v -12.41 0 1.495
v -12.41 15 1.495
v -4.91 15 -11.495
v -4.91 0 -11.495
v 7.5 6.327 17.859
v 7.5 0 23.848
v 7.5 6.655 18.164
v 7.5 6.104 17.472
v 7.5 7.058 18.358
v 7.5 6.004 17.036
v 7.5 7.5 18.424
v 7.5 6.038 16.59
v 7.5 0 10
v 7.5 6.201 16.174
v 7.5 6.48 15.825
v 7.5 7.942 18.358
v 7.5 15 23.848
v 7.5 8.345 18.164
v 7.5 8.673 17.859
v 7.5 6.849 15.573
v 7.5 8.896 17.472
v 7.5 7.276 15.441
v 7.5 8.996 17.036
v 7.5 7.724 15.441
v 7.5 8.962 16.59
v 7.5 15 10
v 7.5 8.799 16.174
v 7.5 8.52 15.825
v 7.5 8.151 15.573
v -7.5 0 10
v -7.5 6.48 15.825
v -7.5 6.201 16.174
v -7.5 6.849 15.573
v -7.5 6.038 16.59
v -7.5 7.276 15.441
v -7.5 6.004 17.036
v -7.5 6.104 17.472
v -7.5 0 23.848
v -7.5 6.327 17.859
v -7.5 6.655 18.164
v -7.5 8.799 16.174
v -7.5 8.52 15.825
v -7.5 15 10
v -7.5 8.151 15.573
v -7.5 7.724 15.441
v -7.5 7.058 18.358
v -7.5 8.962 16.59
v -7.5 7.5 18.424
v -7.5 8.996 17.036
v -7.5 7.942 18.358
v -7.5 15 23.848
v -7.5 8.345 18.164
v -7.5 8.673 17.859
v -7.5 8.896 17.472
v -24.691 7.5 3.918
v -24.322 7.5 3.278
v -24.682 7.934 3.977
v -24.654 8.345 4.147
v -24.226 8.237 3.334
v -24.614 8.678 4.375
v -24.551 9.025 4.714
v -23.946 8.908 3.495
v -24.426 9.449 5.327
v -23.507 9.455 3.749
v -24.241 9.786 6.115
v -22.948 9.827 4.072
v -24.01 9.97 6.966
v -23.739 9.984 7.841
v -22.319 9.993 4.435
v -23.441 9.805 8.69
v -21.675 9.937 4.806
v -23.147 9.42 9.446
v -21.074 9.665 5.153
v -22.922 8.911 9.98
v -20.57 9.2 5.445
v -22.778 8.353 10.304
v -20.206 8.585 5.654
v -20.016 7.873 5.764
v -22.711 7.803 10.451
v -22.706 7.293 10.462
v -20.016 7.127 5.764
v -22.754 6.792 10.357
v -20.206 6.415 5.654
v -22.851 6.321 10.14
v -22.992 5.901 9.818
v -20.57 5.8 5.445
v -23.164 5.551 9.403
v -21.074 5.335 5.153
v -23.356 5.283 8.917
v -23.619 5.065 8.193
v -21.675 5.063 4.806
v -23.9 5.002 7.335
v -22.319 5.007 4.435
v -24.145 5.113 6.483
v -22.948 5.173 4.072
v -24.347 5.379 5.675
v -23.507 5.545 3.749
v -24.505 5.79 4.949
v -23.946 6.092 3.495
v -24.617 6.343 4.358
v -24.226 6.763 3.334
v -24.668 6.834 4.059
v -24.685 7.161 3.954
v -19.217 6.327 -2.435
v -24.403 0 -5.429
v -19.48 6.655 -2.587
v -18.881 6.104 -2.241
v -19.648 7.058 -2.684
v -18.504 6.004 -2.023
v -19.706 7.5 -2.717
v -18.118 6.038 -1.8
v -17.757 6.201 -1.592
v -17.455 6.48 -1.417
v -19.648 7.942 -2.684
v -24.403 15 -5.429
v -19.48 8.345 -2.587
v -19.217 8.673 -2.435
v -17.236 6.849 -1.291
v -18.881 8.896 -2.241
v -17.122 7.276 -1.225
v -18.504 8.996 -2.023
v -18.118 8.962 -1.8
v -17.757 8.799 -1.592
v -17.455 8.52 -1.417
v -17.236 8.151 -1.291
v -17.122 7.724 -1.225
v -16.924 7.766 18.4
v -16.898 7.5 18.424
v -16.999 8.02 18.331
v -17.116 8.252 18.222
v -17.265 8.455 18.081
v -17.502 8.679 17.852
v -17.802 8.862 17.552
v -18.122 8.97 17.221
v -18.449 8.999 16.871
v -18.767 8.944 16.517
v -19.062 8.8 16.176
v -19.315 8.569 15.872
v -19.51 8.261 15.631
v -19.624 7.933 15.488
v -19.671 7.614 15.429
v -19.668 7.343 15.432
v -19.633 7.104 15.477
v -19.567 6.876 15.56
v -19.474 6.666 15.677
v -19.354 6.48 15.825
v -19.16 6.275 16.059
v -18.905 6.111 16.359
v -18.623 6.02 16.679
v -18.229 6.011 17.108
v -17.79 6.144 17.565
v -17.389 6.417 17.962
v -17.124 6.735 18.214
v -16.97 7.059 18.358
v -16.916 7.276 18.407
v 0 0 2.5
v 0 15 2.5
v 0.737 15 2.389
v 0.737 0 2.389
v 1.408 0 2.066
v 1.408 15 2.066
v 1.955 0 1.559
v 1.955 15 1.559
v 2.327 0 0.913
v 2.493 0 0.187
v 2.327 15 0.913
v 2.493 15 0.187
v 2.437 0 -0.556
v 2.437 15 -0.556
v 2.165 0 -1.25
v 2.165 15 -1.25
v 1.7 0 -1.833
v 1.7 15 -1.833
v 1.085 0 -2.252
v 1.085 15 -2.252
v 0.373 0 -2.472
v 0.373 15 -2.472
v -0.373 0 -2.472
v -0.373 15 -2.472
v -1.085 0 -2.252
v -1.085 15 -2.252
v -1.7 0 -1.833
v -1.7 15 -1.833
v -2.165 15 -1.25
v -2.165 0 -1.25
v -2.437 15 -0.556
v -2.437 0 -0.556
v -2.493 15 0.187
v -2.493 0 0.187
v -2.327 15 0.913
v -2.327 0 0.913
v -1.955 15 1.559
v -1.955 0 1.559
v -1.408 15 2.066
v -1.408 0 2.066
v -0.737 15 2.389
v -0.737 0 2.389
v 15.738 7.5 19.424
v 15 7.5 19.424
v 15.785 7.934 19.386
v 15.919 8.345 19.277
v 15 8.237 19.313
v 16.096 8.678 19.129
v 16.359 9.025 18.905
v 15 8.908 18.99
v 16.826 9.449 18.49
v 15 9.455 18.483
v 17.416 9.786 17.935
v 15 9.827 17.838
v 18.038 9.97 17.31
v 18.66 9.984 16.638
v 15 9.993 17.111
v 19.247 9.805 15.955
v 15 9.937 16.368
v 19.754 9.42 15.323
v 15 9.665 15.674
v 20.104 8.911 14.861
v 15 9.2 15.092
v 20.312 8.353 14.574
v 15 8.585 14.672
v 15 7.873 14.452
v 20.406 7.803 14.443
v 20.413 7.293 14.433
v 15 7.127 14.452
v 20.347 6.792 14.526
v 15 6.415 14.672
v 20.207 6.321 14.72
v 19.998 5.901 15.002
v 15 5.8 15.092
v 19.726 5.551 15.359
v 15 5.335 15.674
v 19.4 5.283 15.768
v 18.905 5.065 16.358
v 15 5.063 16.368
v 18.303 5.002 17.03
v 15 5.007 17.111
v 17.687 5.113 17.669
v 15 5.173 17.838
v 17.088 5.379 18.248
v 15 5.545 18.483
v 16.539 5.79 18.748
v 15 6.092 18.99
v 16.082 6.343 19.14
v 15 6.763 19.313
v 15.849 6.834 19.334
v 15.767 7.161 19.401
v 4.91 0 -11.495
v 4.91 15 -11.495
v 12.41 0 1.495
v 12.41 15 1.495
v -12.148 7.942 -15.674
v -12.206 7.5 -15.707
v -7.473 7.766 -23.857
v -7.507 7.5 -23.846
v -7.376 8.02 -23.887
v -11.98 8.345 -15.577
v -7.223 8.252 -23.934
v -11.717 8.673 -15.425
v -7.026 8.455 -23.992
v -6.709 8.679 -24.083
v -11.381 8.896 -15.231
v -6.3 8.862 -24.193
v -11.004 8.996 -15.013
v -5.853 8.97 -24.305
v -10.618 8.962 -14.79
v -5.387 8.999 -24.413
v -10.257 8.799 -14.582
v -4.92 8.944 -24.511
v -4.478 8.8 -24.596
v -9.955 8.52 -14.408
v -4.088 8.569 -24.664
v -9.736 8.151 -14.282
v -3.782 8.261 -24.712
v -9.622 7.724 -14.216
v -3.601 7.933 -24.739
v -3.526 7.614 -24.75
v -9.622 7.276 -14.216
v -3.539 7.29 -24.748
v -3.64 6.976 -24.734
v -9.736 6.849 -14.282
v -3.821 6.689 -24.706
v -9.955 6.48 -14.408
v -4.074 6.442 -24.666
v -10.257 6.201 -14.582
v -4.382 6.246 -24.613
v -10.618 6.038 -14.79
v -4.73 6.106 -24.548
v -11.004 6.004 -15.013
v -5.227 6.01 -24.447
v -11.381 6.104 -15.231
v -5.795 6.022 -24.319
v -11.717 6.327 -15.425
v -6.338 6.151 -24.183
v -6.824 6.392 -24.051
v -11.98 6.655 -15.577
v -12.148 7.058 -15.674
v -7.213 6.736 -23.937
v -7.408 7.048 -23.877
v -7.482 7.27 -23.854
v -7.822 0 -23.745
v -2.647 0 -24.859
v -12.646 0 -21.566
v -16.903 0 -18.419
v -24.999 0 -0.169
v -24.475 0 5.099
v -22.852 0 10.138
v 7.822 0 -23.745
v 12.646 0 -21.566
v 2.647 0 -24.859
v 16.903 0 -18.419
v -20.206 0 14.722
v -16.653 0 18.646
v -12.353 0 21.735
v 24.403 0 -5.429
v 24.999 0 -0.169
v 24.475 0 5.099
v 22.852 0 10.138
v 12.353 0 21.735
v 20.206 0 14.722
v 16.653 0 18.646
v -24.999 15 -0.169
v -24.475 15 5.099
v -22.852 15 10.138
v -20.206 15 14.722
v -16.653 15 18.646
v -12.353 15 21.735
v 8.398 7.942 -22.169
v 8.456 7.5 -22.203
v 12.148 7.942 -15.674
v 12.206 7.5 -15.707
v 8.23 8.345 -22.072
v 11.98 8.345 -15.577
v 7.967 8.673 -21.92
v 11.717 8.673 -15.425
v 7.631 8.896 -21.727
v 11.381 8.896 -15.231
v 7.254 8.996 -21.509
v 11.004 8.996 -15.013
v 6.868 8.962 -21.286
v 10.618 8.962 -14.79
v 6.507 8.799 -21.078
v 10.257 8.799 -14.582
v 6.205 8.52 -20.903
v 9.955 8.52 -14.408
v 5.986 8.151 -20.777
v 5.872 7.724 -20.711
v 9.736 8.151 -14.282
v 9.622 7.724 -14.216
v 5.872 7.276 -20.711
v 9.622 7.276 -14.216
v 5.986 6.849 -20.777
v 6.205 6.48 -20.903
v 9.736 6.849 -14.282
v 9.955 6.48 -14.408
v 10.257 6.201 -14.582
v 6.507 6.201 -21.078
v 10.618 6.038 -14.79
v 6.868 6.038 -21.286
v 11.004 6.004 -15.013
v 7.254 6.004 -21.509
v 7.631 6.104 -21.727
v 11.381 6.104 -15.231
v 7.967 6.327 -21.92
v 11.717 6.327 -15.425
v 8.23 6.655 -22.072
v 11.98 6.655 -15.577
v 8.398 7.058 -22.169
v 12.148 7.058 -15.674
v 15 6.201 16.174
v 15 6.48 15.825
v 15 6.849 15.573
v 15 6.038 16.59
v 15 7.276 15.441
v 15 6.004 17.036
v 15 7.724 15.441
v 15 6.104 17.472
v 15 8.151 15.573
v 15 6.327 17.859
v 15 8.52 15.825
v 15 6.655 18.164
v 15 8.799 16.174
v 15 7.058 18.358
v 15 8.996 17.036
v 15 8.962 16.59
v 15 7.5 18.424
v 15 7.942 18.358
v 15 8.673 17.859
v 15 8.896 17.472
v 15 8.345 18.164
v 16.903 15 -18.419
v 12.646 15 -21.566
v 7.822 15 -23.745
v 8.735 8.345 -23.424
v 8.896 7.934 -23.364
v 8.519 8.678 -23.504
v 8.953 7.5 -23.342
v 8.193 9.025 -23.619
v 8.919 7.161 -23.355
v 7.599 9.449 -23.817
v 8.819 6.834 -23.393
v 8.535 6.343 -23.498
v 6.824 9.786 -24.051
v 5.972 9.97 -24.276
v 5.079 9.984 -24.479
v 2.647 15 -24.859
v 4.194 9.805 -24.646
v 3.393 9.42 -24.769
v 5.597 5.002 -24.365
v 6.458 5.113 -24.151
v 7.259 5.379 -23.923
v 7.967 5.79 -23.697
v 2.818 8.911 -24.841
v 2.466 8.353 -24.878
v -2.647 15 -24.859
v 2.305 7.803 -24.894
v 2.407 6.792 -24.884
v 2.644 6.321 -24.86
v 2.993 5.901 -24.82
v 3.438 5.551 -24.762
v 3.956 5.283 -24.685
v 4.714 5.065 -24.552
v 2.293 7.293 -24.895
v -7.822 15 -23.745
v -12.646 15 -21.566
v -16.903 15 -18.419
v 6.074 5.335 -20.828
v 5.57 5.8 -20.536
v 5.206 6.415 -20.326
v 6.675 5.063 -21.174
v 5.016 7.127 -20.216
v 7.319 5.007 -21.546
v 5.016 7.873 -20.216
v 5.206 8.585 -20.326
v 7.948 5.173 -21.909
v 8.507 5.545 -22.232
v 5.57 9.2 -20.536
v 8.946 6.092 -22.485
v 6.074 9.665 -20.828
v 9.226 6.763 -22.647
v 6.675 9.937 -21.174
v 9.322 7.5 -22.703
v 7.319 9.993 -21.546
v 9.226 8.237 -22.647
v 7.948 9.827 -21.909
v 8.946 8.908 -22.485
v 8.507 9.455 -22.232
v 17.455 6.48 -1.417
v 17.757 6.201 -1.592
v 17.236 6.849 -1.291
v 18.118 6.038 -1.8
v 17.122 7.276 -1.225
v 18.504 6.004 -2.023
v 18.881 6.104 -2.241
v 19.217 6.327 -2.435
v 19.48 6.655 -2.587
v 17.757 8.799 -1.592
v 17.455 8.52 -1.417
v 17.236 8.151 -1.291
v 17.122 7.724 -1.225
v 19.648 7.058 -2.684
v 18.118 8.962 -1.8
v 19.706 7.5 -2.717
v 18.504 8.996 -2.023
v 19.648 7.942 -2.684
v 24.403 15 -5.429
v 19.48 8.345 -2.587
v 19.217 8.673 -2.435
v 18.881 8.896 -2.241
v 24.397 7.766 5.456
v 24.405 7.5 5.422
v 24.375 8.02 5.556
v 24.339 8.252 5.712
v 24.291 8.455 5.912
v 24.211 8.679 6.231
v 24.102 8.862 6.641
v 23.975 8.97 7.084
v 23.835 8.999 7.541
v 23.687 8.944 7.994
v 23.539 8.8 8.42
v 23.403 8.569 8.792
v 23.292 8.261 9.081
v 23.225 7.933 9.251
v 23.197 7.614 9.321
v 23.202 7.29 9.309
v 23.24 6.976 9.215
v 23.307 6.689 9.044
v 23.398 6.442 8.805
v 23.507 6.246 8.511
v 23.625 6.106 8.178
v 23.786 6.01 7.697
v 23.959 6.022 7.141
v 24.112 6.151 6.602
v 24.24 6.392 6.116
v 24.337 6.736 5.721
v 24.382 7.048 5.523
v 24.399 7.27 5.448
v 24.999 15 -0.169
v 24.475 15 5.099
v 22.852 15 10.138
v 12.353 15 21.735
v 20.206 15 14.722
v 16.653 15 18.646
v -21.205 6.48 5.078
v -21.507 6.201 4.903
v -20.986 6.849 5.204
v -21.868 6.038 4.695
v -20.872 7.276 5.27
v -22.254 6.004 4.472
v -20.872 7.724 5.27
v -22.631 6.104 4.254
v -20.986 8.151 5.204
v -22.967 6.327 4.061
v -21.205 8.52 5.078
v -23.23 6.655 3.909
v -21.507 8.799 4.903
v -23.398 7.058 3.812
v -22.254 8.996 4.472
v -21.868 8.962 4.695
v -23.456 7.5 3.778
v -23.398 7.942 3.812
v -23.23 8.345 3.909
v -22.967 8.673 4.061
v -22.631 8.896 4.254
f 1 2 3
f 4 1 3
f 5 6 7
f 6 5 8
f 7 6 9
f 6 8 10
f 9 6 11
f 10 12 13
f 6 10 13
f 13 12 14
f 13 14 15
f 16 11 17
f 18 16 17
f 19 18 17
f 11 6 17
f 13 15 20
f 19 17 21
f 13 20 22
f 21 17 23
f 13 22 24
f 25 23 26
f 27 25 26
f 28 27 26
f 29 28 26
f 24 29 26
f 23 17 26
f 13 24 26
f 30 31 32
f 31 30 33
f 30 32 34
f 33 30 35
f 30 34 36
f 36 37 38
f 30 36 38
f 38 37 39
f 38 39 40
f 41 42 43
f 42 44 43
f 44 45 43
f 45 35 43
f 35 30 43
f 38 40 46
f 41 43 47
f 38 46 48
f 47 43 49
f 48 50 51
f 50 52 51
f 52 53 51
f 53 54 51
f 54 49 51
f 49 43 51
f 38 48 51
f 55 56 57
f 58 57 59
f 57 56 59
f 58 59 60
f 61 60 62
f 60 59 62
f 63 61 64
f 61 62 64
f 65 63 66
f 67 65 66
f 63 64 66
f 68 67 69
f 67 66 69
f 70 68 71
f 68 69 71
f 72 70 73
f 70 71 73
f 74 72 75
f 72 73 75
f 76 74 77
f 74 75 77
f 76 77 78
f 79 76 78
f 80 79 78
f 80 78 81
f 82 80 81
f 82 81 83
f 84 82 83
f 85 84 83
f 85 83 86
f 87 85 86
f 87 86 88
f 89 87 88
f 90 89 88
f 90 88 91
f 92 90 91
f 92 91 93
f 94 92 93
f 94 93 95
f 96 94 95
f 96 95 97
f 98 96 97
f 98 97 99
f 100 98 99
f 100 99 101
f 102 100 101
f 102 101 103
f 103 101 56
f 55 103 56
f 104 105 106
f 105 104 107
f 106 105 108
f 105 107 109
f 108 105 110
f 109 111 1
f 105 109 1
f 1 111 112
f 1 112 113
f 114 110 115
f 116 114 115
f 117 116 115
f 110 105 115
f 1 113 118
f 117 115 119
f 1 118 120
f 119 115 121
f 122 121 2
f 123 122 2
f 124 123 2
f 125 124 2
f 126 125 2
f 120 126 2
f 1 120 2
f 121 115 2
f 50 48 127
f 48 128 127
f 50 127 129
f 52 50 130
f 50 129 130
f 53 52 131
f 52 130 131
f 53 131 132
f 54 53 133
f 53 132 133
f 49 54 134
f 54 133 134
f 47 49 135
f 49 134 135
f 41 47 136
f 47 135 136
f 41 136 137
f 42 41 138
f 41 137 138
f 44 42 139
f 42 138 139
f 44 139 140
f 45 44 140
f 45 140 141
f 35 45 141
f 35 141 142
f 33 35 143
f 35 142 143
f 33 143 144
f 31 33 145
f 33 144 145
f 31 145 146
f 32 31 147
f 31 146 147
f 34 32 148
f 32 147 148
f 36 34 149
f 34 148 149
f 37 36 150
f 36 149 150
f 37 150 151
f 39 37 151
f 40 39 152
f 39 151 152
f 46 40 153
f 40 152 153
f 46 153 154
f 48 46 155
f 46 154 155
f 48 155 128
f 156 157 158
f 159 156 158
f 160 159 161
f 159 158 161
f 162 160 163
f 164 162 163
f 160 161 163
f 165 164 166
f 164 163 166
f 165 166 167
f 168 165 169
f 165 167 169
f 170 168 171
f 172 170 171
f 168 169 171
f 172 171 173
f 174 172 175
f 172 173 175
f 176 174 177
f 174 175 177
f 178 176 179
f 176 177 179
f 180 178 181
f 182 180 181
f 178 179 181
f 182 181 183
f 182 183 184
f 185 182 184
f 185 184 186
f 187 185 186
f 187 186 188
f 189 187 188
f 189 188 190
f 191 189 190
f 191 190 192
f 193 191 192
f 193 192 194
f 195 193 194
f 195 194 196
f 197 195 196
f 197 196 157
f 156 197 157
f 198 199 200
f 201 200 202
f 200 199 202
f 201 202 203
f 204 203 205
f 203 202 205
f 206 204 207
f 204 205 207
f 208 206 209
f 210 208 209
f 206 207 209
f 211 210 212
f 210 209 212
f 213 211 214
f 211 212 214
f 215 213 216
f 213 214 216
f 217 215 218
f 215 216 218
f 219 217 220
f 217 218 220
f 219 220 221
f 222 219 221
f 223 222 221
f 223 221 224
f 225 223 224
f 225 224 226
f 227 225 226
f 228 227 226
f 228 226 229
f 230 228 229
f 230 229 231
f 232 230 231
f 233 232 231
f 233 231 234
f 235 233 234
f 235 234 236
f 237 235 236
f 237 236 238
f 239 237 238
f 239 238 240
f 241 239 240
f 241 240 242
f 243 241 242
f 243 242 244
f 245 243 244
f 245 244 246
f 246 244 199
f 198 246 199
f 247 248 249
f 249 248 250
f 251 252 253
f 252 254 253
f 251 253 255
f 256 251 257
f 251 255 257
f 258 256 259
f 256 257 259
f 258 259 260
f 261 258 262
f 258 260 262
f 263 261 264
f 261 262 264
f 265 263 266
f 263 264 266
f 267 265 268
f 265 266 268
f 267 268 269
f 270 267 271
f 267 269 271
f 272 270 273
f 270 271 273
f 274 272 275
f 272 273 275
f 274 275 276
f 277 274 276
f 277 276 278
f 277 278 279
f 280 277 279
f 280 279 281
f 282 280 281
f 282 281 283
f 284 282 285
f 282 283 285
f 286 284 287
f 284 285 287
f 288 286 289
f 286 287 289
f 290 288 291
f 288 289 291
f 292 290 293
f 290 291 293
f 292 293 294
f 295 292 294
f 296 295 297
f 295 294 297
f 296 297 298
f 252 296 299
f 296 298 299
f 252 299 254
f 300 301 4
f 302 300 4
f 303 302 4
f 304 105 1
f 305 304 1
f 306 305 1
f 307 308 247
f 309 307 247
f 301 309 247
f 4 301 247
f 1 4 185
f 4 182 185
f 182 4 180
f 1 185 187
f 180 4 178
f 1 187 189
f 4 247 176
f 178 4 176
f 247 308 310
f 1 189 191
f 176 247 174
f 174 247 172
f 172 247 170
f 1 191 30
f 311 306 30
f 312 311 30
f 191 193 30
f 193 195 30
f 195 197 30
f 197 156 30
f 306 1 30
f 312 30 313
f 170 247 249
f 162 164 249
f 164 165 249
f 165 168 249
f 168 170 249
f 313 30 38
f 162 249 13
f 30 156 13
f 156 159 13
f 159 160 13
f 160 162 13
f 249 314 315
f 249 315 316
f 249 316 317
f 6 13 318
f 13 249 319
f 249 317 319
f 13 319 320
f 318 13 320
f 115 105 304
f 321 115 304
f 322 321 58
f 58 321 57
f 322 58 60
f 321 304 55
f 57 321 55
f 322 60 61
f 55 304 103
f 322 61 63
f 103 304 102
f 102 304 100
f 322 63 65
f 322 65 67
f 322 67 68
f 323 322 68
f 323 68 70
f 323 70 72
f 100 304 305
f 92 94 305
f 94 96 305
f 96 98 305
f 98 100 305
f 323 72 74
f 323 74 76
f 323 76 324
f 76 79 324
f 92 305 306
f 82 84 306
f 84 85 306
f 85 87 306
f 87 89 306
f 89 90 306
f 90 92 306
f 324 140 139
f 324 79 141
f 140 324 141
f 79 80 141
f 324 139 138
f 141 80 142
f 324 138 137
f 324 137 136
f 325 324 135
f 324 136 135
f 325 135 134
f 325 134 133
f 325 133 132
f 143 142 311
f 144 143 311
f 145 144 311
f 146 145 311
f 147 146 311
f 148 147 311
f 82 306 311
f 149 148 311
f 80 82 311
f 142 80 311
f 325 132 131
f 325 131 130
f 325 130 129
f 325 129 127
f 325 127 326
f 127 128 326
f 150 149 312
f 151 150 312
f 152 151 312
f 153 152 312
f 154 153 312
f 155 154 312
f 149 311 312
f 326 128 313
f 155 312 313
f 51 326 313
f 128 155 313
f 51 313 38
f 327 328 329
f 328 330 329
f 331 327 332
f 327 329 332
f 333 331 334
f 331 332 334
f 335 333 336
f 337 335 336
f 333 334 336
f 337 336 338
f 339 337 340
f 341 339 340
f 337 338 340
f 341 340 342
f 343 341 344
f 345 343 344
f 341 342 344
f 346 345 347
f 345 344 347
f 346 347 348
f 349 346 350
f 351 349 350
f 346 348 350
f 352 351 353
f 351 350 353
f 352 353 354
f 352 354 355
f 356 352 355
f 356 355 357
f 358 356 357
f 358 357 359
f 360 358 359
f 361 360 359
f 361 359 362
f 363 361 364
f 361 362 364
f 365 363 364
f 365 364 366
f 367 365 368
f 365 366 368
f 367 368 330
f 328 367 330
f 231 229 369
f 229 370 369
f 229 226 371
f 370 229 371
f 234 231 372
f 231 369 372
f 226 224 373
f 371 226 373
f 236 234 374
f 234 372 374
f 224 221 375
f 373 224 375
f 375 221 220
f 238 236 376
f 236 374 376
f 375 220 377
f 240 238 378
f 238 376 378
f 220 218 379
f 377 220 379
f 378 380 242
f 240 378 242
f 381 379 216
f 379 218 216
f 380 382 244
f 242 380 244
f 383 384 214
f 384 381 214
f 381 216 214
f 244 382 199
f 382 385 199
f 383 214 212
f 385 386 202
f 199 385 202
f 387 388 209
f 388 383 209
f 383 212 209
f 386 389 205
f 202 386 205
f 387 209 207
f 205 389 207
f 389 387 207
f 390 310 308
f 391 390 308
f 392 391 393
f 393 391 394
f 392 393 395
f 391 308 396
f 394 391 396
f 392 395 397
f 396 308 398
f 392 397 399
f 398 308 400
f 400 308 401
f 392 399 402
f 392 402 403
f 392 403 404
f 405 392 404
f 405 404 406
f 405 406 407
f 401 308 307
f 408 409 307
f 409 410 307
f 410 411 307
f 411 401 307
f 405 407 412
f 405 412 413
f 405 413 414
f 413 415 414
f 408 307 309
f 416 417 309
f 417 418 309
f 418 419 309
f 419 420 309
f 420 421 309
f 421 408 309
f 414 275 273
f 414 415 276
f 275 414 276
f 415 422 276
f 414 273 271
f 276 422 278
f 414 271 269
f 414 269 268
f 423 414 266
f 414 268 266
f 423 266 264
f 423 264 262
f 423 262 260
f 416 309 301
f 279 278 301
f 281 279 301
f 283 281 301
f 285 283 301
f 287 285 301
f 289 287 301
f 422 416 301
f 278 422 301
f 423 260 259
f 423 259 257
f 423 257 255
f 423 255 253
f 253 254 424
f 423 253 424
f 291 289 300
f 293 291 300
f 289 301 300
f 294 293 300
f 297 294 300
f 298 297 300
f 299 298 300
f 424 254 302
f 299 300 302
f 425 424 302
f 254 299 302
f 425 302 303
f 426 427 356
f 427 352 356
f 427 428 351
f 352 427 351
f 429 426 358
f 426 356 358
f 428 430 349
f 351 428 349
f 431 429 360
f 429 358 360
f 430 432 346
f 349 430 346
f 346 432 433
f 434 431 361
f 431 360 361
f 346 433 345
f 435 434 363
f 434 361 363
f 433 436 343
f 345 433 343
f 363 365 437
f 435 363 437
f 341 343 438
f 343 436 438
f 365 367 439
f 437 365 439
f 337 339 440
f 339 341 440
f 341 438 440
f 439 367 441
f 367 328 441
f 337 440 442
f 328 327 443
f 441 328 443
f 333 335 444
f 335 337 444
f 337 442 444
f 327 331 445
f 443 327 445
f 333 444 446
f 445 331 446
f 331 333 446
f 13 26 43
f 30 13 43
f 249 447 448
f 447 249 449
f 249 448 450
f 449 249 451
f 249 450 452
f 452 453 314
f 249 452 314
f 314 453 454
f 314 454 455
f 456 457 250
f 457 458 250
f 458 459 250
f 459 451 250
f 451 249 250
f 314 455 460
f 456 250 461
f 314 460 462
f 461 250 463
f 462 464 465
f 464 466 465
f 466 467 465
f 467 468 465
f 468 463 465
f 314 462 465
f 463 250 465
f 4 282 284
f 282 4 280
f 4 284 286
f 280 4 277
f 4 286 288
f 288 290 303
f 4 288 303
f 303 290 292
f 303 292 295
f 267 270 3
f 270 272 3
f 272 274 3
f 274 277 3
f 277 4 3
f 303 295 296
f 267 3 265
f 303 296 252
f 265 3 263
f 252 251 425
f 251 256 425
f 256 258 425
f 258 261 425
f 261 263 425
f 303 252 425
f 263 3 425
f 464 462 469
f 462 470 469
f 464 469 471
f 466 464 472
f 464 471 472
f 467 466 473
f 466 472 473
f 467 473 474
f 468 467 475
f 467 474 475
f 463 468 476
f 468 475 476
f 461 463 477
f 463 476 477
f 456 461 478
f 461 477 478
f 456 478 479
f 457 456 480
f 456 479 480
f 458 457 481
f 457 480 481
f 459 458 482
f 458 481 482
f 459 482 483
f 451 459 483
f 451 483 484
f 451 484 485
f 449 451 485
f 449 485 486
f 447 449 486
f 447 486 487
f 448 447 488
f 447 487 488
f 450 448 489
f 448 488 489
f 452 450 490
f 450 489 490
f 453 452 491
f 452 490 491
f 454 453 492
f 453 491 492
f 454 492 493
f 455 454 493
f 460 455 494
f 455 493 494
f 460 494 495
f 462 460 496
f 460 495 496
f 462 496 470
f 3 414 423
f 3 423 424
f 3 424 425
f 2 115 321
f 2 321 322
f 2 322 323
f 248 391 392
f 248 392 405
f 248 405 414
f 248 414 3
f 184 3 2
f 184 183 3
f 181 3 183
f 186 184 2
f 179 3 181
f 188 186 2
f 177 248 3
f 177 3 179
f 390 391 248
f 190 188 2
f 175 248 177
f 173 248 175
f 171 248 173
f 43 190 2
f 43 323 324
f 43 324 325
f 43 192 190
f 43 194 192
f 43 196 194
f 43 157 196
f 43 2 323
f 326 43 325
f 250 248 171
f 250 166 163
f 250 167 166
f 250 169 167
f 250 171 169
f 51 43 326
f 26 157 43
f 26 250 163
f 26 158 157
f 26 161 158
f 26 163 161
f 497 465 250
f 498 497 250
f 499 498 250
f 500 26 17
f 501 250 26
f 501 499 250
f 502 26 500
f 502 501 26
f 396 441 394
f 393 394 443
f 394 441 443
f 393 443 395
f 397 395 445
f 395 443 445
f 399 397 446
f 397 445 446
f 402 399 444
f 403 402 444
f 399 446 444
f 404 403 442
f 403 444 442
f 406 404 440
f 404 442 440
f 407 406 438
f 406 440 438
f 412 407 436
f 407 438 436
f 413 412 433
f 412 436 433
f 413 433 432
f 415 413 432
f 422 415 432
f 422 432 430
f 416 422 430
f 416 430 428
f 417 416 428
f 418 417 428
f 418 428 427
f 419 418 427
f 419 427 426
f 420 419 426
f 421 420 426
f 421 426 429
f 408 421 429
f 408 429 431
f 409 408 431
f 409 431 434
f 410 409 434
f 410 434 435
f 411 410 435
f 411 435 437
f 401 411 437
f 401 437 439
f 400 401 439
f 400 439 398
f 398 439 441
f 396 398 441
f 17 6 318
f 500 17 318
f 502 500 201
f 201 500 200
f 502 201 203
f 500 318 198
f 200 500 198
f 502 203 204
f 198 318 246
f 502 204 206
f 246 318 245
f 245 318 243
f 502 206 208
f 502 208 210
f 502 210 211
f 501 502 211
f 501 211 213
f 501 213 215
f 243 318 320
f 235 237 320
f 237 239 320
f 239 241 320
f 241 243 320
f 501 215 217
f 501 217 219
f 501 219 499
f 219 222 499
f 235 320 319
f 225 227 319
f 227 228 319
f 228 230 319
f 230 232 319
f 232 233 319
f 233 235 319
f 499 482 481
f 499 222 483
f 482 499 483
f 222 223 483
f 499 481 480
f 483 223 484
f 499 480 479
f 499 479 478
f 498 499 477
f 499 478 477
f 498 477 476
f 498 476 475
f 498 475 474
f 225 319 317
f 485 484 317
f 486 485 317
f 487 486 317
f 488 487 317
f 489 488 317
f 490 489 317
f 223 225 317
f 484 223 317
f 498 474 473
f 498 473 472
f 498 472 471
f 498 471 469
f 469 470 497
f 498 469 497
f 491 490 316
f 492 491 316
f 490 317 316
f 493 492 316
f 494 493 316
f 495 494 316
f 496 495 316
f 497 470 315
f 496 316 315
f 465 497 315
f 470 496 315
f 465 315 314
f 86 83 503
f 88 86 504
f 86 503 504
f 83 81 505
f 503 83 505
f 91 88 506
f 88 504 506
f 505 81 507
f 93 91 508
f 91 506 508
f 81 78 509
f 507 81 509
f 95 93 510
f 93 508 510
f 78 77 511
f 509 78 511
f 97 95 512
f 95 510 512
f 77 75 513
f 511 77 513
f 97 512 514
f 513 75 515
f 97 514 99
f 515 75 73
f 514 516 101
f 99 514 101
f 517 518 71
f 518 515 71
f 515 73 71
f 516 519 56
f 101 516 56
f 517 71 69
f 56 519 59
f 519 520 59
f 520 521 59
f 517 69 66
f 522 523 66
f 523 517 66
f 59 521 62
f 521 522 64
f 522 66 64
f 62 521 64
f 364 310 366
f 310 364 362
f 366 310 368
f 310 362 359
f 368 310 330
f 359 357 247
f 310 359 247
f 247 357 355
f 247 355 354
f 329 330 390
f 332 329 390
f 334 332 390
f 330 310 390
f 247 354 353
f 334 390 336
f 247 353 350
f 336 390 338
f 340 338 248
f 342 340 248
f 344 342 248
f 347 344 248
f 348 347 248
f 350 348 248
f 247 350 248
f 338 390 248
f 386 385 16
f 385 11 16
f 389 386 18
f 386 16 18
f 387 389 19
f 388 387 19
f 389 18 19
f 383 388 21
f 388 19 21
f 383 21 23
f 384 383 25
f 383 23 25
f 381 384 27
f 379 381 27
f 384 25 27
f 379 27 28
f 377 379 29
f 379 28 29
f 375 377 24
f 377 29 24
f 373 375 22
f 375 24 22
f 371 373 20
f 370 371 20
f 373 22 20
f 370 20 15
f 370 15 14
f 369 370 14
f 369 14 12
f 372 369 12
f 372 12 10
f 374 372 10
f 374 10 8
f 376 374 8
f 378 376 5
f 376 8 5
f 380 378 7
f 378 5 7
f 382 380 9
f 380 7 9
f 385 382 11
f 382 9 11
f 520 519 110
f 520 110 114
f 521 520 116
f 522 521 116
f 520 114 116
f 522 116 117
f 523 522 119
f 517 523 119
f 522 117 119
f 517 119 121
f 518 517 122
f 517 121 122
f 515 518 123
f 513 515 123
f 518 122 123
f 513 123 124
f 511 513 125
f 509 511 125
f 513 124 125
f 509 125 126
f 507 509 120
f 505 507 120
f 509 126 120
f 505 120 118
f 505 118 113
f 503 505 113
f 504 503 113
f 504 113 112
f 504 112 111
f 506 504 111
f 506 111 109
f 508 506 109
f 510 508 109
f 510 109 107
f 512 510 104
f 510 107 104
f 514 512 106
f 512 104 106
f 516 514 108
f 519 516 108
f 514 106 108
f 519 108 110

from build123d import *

# Parameters (mm, degrees)
SKETCH1_R           = 25
BOSS_EXTRUDE1_DEPTH = 15
CUT_EXTRUDE1_START  = -150
CUT_EXTRUDE1_DEPTH  = 150
SKETCH3_R           = 1.5
CUT_EXTRUDE2_DEPTH  = 44.660622991
CUT_EXTRUDE3_START  = -7.5
SKETCH4_R           = 2.5
CUT_EXTRUDE3_DEPTH  = 10
CIRPATTERN1_COUNT   = 3
SKETCH5_R           = 2.5
CUT_EXTRUDE4_DEPTH  = 39.405728909


with BuildPart() as part:
    # Sketch1 → Boss-Extrude1 (new body)
    with BuildSketch(Plane(origin=(0, 0, 0), x_dir=(1, 0, 0), z_dir=(0, 1, 0))):
        Circle(SKETCH1_R)
    extrude(amount=BOSS_EXTRUDE1_DEPTH)

    # Sketch2 → Cut-Extrude1 (cut)
    with BuildSketch(Plane(origin=(0, 15, 0), x_dir=(1, 0, 0), z_dir=(0, 1, 0)).offset(CUT_EXTRUDE1_START)):
        with BuildLine():
            Line((7.5, -10), (-7.5, -10))
            Line((-7.5, -10), (-7.5, -23.848480035))
            ThreePointArc((-7.5, -23.848480035), (0, -25), (7.5, -23.848480035))
            Line((7.5, -23.848480035), (7.5, -10))
        make_face()
    cut_extrude1 = extrude(amount=CUT_EXTRUDE1_DEPTH, mode=Mode.SUBTRACT)

    # Sketch3 → Cut-Extrude2 (cut, symmetric)
    with BuildSketch(Plane.ZY.offset(-7.5)):
        with Locations((16.924240018, 7.5)):
            Circle(SKETCH3_R)
    cut_extrude2 = extrude(amount=CUT_EXTRUDE2_DEPTH, both=True, mode=Mode.SUBTRACT)

    # Sketch4 → Cut-Extrude3 (cut)
    with BuildSketch(Plane.ZY.offset(-7.5).offset(CUT_EXTRUDE3_START)):
        with Locations((16.924240018, 7.5)):
            Circle(SKETCH4_R)
    cut_extrude3 = extrude(amount=-CUT_EXTRUDE3_DEPTH, mode=Mode.SUBTRACT)

    # CirPattern1: Cut-Extrude1, Cut-Extrude2, Cut-Extrude3 ×3 about axis
    cirpattern1_axis = Axis((0, 15, 0), (0, 1, 0))
    add([cut_extrude1.rotate(cirpattern1_axis, i * 360 / CIRPATTERN1_COUNT) for i in range(1, CIRPATTERN1_COUNT)], mode=Mode.SUBTRACT)
    add([cut_extrude2.rotate(cirpattern1_axis, i * 360 / CIRPATTERN1_COUNT) for i in range(1, CIRPATTERN1_COUNT)], mode=Mode.SUBTRACT)
    add([cut_extrude3.rotate(cirpattern1_axis, i * 360 / CIRPATTERN1_COUNT) for i in range(1, CIRPATTERN1_COUNT)], mode=Mode.SUBTRACT)

    # Sketch5 → Cut-Extrude4 (cut, through all)
    with BuildSketch(Plane(origin=(0, 15, 0), x_dir=(1, 0, 0), z_dir=(0, 1, 0))):
        Circle(SKETCH5_R)
    extrude(amount=-CUT_EXTRUDE4_DEPTH, mode=Mode.SUBTRACT)


solid = part.part
